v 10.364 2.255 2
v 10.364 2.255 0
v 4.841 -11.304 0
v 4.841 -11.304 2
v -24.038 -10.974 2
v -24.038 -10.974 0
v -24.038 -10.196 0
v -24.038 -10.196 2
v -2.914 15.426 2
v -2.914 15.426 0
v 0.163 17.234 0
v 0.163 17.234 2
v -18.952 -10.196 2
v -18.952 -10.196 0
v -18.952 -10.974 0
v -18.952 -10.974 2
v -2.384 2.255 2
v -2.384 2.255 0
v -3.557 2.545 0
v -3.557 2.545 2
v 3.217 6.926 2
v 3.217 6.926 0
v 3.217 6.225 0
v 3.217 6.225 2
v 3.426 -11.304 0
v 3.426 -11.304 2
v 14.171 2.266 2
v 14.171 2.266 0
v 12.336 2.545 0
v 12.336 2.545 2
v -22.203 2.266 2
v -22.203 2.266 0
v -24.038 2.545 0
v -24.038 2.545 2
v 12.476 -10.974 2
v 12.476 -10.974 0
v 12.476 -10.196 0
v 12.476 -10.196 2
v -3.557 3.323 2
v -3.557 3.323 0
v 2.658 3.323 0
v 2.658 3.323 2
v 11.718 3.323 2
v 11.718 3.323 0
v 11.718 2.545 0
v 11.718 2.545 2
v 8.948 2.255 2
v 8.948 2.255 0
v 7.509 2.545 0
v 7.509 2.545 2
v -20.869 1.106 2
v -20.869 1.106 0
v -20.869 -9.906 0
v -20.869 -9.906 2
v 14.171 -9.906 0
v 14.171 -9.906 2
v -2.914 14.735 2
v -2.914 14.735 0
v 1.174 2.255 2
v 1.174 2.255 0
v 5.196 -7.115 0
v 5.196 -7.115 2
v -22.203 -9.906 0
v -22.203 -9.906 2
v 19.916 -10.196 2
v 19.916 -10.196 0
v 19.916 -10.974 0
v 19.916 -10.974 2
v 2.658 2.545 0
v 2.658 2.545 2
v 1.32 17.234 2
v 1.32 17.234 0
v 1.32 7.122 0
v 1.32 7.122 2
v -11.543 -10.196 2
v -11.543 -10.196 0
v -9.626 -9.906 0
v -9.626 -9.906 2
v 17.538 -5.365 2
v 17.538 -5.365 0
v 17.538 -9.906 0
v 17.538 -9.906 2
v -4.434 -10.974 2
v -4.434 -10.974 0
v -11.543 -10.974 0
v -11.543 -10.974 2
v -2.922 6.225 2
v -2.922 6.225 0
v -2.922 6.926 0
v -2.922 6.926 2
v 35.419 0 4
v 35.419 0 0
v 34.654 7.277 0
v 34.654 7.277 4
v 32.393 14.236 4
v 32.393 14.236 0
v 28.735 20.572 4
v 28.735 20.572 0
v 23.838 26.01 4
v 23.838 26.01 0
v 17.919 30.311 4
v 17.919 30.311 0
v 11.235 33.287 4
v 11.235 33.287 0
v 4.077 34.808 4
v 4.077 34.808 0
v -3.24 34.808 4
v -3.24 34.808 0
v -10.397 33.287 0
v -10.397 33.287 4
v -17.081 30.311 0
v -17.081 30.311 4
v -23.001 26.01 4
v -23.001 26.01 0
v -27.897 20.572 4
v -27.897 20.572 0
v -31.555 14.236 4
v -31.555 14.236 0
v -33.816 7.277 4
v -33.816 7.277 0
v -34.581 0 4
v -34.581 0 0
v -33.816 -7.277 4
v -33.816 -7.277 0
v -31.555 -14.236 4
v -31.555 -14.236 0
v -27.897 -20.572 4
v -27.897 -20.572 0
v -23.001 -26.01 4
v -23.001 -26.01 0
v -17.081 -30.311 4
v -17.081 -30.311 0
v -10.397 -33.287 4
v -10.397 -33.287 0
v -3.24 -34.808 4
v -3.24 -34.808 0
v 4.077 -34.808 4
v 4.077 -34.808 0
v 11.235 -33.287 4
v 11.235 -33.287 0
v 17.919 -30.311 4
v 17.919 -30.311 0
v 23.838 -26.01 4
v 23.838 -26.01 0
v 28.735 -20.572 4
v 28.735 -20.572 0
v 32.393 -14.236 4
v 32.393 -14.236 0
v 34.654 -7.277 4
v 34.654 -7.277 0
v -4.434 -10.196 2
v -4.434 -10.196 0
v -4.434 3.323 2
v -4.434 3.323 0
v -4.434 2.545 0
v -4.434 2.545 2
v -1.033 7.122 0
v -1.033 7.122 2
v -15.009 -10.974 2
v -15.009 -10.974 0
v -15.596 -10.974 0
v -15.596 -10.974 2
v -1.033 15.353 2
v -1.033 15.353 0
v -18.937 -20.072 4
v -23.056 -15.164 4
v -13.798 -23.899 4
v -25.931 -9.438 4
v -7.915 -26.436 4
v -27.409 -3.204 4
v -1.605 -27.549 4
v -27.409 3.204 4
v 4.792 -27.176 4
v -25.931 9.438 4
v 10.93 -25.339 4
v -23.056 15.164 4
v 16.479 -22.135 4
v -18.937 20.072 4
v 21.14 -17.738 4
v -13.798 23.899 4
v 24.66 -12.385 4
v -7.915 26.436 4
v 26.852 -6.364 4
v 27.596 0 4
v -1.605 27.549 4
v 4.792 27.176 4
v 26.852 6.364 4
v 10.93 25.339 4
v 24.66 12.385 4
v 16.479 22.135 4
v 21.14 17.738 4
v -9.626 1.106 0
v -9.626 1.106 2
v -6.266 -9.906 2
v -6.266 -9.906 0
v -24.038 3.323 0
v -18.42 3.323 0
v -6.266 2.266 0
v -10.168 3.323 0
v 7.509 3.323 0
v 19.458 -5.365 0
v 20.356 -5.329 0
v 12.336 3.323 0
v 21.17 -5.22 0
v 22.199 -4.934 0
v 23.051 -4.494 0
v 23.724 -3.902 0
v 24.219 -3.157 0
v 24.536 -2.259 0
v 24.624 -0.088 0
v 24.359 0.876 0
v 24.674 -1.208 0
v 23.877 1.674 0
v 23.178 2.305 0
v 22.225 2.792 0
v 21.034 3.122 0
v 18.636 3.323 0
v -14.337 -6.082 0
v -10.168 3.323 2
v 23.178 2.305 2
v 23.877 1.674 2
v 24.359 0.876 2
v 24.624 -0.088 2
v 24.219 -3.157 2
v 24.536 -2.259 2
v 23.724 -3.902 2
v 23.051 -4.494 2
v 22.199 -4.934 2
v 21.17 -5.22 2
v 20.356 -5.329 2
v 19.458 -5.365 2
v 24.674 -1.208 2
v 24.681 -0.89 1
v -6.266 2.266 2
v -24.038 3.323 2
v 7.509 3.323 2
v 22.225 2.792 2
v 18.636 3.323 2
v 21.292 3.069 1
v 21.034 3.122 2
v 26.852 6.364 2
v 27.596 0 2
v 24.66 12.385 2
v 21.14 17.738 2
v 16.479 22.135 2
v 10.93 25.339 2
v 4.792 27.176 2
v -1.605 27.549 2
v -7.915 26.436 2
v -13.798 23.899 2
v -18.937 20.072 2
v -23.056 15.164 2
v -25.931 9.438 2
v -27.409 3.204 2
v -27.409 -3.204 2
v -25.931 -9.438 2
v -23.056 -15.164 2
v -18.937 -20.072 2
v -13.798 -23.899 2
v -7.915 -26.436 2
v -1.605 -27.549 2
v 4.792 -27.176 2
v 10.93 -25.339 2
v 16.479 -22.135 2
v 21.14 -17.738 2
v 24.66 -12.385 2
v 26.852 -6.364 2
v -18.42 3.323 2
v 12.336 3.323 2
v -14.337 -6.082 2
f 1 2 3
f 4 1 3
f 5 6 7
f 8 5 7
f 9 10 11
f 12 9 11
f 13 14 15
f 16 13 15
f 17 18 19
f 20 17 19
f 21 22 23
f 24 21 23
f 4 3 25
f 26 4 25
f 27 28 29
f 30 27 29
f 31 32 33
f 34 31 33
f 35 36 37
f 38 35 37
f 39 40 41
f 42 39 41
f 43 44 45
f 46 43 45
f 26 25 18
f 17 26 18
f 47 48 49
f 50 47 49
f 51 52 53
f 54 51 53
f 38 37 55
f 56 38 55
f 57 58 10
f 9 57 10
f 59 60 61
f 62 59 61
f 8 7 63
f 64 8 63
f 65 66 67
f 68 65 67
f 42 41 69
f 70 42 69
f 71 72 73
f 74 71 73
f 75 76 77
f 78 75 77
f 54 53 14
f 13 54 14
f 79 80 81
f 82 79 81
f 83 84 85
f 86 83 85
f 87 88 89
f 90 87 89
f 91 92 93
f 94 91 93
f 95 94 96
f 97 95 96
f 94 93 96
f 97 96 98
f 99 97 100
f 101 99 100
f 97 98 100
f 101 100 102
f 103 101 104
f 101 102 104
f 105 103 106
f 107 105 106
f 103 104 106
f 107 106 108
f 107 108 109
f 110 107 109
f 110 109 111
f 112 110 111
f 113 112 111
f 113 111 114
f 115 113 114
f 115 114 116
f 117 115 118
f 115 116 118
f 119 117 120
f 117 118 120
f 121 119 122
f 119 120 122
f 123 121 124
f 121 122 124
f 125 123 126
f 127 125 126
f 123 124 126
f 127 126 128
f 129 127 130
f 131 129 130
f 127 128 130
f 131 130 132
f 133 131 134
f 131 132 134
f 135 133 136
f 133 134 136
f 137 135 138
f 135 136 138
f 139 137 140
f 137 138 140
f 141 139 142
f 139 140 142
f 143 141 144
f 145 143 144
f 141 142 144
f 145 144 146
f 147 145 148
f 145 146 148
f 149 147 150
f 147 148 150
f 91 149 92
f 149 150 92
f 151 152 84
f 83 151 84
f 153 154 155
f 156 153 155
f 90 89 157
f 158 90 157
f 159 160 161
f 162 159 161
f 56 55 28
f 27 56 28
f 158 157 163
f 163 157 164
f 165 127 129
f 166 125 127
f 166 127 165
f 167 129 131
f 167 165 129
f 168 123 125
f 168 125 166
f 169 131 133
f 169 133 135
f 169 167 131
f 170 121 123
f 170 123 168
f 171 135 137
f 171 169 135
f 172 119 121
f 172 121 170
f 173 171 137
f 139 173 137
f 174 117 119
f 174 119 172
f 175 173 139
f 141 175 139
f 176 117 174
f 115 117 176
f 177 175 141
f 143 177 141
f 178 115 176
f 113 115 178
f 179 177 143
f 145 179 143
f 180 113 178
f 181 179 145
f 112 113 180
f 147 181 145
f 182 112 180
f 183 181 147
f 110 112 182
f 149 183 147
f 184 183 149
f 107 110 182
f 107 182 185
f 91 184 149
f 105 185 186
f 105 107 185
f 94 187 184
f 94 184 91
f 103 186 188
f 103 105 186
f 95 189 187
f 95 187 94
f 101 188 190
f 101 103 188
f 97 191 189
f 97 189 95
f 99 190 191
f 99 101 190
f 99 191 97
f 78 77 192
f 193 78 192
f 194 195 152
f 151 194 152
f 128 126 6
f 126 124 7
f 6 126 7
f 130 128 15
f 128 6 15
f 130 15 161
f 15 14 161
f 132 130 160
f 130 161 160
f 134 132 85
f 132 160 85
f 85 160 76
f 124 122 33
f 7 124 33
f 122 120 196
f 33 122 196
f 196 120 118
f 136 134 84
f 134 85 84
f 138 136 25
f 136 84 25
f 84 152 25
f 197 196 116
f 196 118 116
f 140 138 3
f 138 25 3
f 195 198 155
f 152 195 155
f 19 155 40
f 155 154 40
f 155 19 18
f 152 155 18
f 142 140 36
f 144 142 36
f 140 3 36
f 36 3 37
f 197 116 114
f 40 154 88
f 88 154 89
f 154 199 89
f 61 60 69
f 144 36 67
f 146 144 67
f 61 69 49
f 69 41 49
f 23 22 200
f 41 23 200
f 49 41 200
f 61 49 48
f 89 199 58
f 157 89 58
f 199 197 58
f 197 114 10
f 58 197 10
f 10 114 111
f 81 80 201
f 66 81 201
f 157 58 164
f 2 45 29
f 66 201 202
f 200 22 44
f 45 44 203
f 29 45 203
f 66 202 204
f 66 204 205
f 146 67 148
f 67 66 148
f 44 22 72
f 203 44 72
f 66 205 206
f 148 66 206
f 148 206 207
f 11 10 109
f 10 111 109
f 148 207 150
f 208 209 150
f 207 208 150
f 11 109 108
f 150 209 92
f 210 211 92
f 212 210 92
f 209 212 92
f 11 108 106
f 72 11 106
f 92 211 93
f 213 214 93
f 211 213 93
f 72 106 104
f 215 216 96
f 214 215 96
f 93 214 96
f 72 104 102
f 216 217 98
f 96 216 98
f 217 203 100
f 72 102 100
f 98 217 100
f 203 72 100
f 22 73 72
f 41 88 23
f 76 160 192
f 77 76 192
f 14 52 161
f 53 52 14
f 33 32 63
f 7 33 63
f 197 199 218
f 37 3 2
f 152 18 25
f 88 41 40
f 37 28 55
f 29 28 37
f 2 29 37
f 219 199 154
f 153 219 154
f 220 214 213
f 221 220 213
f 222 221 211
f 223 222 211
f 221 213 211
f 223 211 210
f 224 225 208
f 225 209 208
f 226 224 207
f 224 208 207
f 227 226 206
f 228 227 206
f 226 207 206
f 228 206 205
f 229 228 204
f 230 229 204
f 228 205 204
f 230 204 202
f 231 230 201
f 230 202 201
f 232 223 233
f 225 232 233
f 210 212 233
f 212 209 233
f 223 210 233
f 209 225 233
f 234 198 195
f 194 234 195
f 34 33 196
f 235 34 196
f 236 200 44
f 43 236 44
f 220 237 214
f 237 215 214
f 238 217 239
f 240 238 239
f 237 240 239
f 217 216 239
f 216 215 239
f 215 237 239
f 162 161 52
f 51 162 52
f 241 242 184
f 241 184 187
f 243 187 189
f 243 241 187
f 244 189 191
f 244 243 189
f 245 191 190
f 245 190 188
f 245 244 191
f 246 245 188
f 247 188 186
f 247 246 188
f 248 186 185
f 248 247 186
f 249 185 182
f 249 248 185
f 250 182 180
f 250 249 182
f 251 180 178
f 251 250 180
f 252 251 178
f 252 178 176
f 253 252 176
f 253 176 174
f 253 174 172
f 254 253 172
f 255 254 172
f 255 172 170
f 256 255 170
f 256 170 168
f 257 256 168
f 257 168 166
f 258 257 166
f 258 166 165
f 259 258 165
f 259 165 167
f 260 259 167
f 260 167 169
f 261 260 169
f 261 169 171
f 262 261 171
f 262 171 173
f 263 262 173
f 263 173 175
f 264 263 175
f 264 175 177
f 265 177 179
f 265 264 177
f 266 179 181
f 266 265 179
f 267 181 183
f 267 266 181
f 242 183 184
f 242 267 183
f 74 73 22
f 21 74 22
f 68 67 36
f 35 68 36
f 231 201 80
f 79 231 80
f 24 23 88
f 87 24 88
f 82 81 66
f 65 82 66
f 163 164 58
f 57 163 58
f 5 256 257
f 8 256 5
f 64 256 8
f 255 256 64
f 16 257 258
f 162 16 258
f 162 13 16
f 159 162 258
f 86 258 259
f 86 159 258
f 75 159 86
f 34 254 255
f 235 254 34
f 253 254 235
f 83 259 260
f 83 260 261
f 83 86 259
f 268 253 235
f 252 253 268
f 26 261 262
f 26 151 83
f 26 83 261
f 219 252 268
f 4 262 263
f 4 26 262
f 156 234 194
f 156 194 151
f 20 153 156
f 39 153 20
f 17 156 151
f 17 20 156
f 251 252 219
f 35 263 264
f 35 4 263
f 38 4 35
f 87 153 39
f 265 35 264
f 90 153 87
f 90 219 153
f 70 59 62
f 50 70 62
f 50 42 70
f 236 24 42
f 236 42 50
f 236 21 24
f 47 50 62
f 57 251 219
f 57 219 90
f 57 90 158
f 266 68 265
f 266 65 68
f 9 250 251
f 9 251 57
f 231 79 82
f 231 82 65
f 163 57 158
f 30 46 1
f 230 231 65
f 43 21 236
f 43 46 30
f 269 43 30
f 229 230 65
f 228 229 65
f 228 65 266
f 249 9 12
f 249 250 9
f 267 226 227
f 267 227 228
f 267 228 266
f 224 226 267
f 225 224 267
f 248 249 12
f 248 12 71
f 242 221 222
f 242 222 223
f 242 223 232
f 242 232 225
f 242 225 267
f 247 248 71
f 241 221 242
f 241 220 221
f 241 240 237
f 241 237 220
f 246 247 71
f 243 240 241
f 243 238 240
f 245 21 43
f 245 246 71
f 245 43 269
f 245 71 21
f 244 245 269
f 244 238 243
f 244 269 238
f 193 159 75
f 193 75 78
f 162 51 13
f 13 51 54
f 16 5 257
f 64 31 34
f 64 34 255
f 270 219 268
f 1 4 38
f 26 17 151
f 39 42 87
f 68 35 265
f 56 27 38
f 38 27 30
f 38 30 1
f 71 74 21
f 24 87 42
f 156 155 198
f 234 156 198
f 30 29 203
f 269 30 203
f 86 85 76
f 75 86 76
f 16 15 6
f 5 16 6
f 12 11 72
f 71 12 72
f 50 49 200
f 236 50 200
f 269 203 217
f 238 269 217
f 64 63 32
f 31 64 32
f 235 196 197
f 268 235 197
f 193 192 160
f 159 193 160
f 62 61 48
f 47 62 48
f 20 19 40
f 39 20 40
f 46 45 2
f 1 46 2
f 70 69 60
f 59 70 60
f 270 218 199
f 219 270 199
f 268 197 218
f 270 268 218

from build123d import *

# Parameters (mm, degrees)
F0_R     = 27.5956860517
F1_DEPTH = 2
F0_R_2   = 35
F2_DEPTH = 4


with BuildPart() as f1:
    # F0 (on Top) → F1 (new body)
    with BuildSketch(Plane.XY):
        Circle(F0_R)
        Polygon((-9.6259148038, 1.1057544772), (-15.0088759263, -10.9735011217), (-15.5956118662, -10.9735011217), (-20.8694128139, 1.1057544772), (-20.8694128139, -9.9057781613), (-18.952287243, -10.1957348758), (-18.952287243, -10.9735011217), (-24.0384691402, -10.9735011217), (-24.0384691402, -10.1957348758), (-22.2032137004, -9.9057781613), (-22.2032137004, 2.265581335), (-24.0384691402, 2.5453042831), (-24.0384691402, 3.3230705289), (-18.4201313906, 3.3230705289), (-14.3368585999, -6.0817607859), (-10.1683044226, 3.3230705289), (-4.4339839872, 3.3230705289), (-4.4339839872, 2.5453042831), (-6.2658281715, 2.265581335), (-6.2658281715, -9.9057781613), (-4.4339839872, -10.1957348758), (-4.4339839872, -10.9735011217), (-11.5430403747, -10.9735011217), (-11.5430403747, -10.1957348758), (-9.6259148038, -9.9057781613), align=None, mode=Mode.SUBTRACT)
        Polygon((7.508821393, 3.3230705289), (11.7183106359, 3.3230705289), (11.7183106359, 2.5453042831), (10.3640422166, 2.2553475686), (4.84121962, -11.3043929017), (3.4255486024, -11.3043929017), (-2.3838194532, 2.2553475686), (-3.5572913329, 2.5453042831), (-3.5572913329, 3.3230705289), (2.6580161229, 3.3230705289), (2.6580161229, 2.5453042831), (1.174119996, 2.2553475686), (5.1959901883, -7.1153711916), (8.948371199, 2.2553475686), (7.508821393, 2.5453042831), align=None, mode=Mode.SUBTRACT)
        with BuildLine():
            Line((19.4584492842, -5.3653971385), (17.5379124579, -5.3653971385))
            Line((17.5379124579, -5.3653971385), (17.5379124579, -9.9057781613))
            Line((17.5379124579, -9.9057781613), (19.9155575165, -10.1957348758))
            Line((19.9155575165, -10.1957348758), (19.9155575165, -10.9735011217))
            Line((19.9155575165, -10.9735011217), (12.475609349, -10.9735011217))
            Line((12.475609349, -10.9735011217), (12.475609349, -10.1957348758))
            Line((12.475609349, -10.1957348758), (14.1710033147, -9.9057781613))
            Line((14.1710033147, -9.9057781613), (14.1710033147, 2.265581335))
            Line((14.1710033147, 2.265581335), (12.3357478749, 2.5453042831))
            Line((12.3357478749, 2.5453042831), (12.3357478749, 3.3230705289))
            Line((12.3357478749, 3.3230705289), (18.6363367174, 3.3230705289))
            add(Edge.make_bspline(
                [(18.6363367174, 3.3230705289), (21.675765336, 3.3230705289), (23.178423368, 2.3048107729)],
                knots=[0, 0, 0, 1, 1, 1], degree=2))
            add(Edge.make_bspline(
                [(23.178423368, 2.3048107729), (24.6810814, 1.2865510168), (24.6810814, -0.8898299694)],
                knots=[0, 0, 0, 1, 1, 1], degree=2))
            add(Edge.make_bspline(
                [(24.6810814, -0.8898299694), (24.6810814, -5.3653971385), (19.4584492842, -5.3653971385)],
                knots=[0, 0, 0, 1, 1, 1], degree=2))
        make_face(mode=Mode.SUBTRACT)
        Polygon((1.3197273183, 17.2339269534), (1.3197273183, 7.1216629411), (3.216591065, 6.9262442858), (3.216591065, 6.2253427091), (-2.9221602911, 6.2253427091), (-2.9221602911, 6.9262442858), (-1.0331132906, 7.1216629411), (-1.0331132906, 15.3526966991), (-2.9143435449, 14.7351737486), (-2.9143435449, 15.4256529971), (0.1628488794, 17.2339269534), align=None, mode=Mode.SUBTRACT)
    extrude(amount=F1_DEPTH)

    # F0 (on Top) → F2 (join)
    with BuildSketch(Plane.XY):
        with Locations((0.418909197, 0)):
            Circle(F0_R_2)
        Circle(F0_R, mode=Mode.SUBTRACT)
    extrude(amount=F2_DEPTH)


solid = f1.part
